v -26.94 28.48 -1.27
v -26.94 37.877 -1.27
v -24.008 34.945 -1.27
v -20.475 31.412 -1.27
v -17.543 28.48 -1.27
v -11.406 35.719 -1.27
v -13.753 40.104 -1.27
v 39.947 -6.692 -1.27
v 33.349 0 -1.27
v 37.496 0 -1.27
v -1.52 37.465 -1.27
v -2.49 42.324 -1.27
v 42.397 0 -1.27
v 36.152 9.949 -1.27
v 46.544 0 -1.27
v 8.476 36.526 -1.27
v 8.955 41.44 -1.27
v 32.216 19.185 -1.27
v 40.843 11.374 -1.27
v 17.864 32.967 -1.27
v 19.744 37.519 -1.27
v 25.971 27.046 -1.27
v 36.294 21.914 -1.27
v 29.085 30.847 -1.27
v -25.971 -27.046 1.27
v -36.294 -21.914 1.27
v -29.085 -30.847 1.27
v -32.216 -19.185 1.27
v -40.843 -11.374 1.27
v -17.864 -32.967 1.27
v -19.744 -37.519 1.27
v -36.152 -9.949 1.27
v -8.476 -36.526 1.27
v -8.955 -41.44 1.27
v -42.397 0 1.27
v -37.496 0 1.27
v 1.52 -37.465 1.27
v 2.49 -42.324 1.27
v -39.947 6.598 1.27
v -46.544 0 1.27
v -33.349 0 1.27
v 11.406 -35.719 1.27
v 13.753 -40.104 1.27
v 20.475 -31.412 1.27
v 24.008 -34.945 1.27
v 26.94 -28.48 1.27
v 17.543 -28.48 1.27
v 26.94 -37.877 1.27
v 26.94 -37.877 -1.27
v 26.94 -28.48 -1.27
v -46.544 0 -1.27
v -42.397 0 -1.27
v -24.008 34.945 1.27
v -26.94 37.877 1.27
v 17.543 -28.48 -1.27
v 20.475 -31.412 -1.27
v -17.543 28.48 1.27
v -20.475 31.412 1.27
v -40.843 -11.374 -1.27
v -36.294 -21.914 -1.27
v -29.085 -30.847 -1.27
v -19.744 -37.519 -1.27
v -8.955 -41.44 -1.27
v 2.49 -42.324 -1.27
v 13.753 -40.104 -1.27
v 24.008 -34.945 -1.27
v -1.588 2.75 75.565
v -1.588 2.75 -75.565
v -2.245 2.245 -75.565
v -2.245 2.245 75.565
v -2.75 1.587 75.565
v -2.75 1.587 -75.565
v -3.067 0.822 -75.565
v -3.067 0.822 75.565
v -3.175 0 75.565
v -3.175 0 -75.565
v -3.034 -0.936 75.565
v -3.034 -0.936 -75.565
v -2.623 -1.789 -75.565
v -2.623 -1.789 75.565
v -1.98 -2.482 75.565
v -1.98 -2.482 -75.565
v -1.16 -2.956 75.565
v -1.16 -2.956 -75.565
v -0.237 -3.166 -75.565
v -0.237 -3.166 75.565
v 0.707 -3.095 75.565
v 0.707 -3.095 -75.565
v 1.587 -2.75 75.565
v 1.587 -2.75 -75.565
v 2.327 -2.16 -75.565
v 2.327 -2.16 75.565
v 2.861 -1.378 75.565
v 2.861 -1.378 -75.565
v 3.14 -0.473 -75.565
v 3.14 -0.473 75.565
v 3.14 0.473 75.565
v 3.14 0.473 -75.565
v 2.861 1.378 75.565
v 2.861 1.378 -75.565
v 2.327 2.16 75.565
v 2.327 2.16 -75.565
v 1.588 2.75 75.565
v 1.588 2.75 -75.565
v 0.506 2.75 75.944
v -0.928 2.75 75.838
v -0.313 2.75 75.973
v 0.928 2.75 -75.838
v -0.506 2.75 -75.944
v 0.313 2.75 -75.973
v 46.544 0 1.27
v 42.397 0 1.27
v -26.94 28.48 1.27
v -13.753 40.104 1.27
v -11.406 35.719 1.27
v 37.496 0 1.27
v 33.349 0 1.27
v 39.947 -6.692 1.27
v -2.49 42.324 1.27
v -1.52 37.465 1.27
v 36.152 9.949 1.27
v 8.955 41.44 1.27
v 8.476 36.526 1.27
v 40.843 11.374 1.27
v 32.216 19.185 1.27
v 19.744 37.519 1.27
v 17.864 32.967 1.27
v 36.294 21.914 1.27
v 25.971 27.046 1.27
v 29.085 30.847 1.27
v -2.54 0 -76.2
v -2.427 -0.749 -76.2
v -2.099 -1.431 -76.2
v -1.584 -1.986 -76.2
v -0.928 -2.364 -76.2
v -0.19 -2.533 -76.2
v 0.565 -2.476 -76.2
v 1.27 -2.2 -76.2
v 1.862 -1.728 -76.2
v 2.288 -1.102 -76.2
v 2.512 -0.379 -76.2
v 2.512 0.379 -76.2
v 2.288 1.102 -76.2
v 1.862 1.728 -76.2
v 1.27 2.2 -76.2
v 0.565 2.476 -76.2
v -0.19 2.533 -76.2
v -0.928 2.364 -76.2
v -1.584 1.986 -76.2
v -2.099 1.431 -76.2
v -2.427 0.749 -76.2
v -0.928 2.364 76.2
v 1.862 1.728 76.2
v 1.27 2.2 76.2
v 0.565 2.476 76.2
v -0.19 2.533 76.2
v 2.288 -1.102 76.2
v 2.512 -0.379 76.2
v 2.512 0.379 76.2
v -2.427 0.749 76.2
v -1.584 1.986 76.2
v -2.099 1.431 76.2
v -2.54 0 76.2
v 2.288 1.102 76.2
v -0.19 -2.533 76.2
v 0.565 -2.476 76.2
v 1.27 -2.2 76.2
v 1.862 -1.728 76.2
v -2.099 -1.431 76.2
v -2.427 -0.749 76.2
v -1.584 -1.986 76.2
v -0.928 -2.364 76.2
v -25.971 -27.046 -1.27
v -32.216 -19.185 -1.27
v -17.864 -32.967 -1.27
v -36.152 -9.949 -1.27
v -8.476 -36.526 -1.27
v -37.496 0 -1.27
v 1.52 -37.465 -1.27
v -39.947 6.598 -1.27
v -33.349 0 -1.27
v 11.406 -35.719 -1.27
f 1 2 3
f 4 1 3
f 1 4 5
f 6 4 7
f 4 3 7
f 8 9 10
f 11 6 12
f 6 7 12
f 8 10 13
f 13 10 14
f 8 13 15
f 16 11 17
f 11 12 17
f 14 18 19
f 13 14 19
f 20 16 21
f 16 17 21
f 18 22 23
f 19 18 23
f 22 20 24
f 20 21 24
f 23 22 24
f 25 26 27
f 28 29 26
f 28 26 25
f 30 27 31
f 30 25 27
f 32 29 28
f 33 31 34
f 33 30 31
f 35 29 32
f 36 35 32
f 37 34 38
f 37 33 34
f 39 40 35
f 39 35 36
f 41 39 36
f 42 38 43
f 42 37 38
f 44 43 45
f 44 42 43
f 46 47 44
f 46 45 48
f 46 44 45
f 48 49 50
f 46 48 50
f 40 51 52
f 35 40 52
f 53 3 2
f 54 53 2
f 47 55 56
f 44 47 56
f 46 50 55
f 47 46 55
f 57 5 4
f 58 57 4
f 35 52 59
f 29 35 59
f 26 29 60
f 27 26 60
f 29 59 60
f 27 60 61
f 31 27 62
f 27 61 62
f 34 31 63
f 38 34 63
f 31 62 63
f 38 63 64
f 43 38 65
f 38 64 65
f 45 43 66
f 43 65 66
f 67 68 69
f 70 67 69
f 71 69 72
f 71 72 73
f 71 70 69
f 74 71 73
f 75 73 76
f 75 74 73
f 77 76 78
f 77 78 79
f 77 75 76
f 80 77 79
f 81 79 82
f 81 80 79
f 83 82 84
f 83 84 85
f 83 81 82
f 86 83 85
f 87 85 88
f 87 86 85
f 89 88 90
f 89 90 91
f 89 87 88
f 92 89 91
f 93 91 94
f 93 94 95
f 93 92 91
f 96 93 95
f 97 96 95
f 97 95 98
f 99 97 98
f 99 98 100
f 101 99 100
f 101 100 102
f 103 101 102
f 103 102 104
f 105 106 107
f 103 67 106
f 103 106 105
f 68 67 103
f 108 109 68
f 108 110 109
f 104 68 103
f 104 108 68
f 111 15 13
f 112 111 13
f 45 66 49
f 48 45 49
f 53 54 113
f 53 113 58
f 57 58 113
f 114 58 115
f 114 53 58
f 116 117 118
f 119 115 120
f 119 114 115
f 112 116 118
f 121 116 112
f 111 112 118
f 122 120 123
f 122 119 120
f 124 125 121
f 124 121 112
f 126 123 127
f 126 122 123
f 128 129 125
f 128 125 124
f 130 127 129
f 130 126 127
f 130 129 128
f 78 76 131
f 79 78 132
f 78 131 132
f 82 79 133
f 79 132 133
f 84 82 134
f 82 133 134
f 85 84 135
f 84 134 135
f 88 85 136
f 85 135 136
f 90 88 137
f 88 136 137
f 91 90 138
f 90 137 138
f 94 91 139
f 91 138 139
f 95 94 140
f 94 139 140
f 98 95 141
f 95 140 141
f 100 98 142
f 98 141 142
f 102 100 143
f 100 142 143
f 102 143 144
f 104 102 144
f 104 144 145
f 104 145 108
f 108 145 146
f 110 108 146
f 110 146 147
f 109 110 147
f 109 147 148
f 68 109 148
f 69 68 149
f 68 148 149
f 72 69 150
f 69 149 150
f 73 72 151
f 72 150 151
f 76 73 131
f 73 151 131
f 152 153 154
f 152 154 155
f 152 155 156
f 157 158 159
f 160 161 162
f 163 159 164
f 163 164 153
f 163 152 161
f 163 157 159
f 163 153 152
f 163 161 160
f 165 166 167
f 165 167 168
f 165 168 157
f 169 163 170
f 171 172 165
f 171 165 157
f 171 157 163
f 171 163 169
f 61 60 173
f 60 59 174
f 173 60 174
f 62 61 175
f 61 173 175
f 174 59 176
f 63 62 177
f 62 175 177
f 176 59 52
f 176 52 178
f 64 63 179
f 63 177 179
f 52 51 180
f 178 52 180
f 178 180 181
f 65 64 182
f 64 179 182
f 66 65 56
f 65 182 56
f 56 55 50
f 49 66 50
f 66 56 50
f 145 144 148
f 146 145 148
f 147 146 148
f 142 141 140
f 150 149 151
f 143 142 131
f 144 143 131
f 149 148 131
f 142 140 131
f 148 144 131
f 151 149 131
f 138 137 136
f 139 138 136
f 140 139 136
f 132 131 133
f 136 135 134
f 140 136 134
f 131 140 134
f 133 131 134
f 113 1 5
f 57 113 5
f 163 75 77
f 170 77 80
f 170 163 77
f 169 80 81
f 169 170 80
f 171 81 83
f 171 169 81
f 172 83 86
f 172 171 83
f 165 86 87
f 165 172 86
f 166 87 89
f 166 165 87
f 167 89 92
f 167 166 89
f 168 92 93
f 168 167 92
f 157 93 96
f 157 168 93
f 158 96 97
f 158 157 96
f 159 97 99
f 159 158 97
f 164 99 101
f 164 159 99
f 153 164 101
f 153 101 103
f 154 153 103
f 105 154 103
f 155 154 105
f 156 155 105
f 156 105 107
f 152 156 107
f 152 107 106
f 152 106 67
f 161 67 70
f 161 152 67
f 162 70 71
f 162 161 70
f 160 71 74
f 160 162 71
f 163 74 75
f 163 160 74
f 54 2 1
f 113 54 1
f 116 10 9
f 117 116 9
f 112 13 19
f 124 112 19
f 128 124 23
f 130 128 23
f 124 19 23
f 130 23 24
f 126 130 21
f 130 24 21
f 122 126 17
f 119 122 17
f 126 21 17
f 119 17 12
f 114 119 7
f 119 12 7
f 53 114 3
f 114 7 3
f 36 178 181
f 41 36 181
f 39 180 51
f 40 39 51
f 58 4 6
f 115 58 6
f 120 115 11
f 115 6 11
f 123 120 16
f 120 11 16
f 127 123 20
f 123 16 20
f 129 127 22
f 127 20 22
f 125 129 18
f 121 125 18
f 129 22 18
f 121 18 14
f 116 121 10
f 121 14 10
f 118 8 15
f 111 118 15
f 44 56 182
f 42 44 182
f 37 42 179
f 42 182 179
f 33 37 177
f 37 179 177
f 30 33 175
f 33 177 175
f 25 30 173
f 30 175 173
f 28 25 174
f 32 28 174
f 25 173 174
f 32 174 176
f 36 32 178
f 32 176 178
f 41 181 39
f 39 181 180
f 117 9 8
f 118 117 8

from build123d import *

# Parameters (mm, degrees)
SKETCH1_R                  = 3.175
EXTRUDE1_DEPTH             = 76.2
CHAMFER1_SIZE              = 0.635
EXTRUDE7_DEPTH             = 77.332177029
EXTRUDE7_DEPTH_BACK        = 77.332177029
BOSS_EXTRUDE1_DEPTH        = 1.27
BOSS_EXTRUDE1_DEPTH_BACK   = 1.27
BOSS_EXTRUDE1_2_DEPTH      = 1.27
BOSS_EXTRUDE1_2_DEPTH_BACK = 1.27


with BuildPart() as part:
    # Sketch1 → Extrude1 (new, symmetric)
    with BuildSketch(Plane.XY):
        Circle(SKETCH1_R)
    extrude(amount=EXTRUDE1_DEPTH, both=True)

    # Chamfer1
    chamfer1_edges = [part.edges().sort_by_distance(p)[0] for p in [
        (-3.175, 0, -76.2),
        (-3.175, 0, 76.2),
    ]]
    chamfer(chamfer1_edges, length=CHAMFER1_SIZE)

    # Sketch13 → Extrude7 (cut, two sides: drawn at the far end of the back side and taken through both)
    with BuildSketch(Plane.XY.offset(-EXTRUDE7_DEPTH_BACK)):
        with BuildLine():
            Line((-1.5875, 2.749630657), (1.5875, 2.749630657))
            ThreePointArc((1.5875, 2.749630657), (0, 3.175), (-1.5875, 2.749630657))
        make_face()
    extrude(amount=EXTRUDE7_DEPTH + EXTRUDE7_DEPTH_BACK, mode=Mode.SUBTRACT)


with BuildPart() as body_2:
    # Sketch16 → Boss-Extrude1 (new, two sides: drawn at the far end of the back side and taken through both)
    with BuildSketch(Plane.XY.offset(-BOSS_EXTRUDE1_DEPTH_BACK)):
        with BuildLine():
            Line((-17.542718978, 28.479648421), (-20.475297312, 31.412226755))
            ThreePointArc((-20.475297312, 31.412226755), (17.863646534, 32.967497968), (37.496210339, 0))
            Line((37.496210339, 0), (33.348918286, 0))
            Line((33.348918286, 0), (39.946532873, -6.692163745))
            Line((39.946532873, -6.692163745), (46.54414746, 0))
            Line((46.54414746, 0), (42.396855407, 0))
            ThreePointArc((42.396855407, 0), (19.743905376, 37.518949197), (-24.007670842, 34.944600285))
            Line((-24.007670842, 34.944600285), (-26.940249176, 37.877178619))
            Line((-26.940249176, 37.877178619), (-26.940249176, 28.479648421))
            Line((-26.940249176, 28.479648421), (-17.542718978, 28.479648421))
        make_face()
    extrude(amount=BOSS_EXTRUDE1_DEPTH + BOSS_EXTRUDE1_DEPTH_BACK)


with BuildPart() as body_3:
    # Sketch16 → Boss-Extrude1 2 (new, two sides: drawn at the far end of the back side and taken through both)
    with BuildSketch(Plane.XY.offset(-BOSS_EXTRUDE1_2_DEPTH_BACK)):
        with BuildLine():
            Line((17.542718978, -28.479648421), (20.475297312, -31.412226755))
            ThreePointArc((20.475297312, -31.412226755), (-17.863646534, -32.967497968), (-37.496210339, 0))
            Line((-37.496210339, 0), (-33.348918286, 0))
            Line((-33.348918286, 0), (-39.946532873, 6.597614587))
            Line((-39.946532873, 6.597614587), (-46.54414746, 0))
            Line((-46.54414746, 0), (-42.396855407, 0))
            ThreePointArc((-42.396855407, 0), (-19.743905376, -37.518949197), (24.007670842, -34.944600285))
            Line((24.007670842, -34.944600285), (26.940249176, -37.877178619))
            Line((26.940249176, -37.877178619), (26.940249176, -28.479648421))
            Line((26.940249176, -28.479648421), (17.542718978, -28.479648421))
        make_face()
    extrude(amount=BOSS_EXTRUDE1_2_DEPTH + BOSS_EXTRUDE1_2_DEPTH_BACK)


solid = Compound([part.part, body_2.part, body_3.part])
